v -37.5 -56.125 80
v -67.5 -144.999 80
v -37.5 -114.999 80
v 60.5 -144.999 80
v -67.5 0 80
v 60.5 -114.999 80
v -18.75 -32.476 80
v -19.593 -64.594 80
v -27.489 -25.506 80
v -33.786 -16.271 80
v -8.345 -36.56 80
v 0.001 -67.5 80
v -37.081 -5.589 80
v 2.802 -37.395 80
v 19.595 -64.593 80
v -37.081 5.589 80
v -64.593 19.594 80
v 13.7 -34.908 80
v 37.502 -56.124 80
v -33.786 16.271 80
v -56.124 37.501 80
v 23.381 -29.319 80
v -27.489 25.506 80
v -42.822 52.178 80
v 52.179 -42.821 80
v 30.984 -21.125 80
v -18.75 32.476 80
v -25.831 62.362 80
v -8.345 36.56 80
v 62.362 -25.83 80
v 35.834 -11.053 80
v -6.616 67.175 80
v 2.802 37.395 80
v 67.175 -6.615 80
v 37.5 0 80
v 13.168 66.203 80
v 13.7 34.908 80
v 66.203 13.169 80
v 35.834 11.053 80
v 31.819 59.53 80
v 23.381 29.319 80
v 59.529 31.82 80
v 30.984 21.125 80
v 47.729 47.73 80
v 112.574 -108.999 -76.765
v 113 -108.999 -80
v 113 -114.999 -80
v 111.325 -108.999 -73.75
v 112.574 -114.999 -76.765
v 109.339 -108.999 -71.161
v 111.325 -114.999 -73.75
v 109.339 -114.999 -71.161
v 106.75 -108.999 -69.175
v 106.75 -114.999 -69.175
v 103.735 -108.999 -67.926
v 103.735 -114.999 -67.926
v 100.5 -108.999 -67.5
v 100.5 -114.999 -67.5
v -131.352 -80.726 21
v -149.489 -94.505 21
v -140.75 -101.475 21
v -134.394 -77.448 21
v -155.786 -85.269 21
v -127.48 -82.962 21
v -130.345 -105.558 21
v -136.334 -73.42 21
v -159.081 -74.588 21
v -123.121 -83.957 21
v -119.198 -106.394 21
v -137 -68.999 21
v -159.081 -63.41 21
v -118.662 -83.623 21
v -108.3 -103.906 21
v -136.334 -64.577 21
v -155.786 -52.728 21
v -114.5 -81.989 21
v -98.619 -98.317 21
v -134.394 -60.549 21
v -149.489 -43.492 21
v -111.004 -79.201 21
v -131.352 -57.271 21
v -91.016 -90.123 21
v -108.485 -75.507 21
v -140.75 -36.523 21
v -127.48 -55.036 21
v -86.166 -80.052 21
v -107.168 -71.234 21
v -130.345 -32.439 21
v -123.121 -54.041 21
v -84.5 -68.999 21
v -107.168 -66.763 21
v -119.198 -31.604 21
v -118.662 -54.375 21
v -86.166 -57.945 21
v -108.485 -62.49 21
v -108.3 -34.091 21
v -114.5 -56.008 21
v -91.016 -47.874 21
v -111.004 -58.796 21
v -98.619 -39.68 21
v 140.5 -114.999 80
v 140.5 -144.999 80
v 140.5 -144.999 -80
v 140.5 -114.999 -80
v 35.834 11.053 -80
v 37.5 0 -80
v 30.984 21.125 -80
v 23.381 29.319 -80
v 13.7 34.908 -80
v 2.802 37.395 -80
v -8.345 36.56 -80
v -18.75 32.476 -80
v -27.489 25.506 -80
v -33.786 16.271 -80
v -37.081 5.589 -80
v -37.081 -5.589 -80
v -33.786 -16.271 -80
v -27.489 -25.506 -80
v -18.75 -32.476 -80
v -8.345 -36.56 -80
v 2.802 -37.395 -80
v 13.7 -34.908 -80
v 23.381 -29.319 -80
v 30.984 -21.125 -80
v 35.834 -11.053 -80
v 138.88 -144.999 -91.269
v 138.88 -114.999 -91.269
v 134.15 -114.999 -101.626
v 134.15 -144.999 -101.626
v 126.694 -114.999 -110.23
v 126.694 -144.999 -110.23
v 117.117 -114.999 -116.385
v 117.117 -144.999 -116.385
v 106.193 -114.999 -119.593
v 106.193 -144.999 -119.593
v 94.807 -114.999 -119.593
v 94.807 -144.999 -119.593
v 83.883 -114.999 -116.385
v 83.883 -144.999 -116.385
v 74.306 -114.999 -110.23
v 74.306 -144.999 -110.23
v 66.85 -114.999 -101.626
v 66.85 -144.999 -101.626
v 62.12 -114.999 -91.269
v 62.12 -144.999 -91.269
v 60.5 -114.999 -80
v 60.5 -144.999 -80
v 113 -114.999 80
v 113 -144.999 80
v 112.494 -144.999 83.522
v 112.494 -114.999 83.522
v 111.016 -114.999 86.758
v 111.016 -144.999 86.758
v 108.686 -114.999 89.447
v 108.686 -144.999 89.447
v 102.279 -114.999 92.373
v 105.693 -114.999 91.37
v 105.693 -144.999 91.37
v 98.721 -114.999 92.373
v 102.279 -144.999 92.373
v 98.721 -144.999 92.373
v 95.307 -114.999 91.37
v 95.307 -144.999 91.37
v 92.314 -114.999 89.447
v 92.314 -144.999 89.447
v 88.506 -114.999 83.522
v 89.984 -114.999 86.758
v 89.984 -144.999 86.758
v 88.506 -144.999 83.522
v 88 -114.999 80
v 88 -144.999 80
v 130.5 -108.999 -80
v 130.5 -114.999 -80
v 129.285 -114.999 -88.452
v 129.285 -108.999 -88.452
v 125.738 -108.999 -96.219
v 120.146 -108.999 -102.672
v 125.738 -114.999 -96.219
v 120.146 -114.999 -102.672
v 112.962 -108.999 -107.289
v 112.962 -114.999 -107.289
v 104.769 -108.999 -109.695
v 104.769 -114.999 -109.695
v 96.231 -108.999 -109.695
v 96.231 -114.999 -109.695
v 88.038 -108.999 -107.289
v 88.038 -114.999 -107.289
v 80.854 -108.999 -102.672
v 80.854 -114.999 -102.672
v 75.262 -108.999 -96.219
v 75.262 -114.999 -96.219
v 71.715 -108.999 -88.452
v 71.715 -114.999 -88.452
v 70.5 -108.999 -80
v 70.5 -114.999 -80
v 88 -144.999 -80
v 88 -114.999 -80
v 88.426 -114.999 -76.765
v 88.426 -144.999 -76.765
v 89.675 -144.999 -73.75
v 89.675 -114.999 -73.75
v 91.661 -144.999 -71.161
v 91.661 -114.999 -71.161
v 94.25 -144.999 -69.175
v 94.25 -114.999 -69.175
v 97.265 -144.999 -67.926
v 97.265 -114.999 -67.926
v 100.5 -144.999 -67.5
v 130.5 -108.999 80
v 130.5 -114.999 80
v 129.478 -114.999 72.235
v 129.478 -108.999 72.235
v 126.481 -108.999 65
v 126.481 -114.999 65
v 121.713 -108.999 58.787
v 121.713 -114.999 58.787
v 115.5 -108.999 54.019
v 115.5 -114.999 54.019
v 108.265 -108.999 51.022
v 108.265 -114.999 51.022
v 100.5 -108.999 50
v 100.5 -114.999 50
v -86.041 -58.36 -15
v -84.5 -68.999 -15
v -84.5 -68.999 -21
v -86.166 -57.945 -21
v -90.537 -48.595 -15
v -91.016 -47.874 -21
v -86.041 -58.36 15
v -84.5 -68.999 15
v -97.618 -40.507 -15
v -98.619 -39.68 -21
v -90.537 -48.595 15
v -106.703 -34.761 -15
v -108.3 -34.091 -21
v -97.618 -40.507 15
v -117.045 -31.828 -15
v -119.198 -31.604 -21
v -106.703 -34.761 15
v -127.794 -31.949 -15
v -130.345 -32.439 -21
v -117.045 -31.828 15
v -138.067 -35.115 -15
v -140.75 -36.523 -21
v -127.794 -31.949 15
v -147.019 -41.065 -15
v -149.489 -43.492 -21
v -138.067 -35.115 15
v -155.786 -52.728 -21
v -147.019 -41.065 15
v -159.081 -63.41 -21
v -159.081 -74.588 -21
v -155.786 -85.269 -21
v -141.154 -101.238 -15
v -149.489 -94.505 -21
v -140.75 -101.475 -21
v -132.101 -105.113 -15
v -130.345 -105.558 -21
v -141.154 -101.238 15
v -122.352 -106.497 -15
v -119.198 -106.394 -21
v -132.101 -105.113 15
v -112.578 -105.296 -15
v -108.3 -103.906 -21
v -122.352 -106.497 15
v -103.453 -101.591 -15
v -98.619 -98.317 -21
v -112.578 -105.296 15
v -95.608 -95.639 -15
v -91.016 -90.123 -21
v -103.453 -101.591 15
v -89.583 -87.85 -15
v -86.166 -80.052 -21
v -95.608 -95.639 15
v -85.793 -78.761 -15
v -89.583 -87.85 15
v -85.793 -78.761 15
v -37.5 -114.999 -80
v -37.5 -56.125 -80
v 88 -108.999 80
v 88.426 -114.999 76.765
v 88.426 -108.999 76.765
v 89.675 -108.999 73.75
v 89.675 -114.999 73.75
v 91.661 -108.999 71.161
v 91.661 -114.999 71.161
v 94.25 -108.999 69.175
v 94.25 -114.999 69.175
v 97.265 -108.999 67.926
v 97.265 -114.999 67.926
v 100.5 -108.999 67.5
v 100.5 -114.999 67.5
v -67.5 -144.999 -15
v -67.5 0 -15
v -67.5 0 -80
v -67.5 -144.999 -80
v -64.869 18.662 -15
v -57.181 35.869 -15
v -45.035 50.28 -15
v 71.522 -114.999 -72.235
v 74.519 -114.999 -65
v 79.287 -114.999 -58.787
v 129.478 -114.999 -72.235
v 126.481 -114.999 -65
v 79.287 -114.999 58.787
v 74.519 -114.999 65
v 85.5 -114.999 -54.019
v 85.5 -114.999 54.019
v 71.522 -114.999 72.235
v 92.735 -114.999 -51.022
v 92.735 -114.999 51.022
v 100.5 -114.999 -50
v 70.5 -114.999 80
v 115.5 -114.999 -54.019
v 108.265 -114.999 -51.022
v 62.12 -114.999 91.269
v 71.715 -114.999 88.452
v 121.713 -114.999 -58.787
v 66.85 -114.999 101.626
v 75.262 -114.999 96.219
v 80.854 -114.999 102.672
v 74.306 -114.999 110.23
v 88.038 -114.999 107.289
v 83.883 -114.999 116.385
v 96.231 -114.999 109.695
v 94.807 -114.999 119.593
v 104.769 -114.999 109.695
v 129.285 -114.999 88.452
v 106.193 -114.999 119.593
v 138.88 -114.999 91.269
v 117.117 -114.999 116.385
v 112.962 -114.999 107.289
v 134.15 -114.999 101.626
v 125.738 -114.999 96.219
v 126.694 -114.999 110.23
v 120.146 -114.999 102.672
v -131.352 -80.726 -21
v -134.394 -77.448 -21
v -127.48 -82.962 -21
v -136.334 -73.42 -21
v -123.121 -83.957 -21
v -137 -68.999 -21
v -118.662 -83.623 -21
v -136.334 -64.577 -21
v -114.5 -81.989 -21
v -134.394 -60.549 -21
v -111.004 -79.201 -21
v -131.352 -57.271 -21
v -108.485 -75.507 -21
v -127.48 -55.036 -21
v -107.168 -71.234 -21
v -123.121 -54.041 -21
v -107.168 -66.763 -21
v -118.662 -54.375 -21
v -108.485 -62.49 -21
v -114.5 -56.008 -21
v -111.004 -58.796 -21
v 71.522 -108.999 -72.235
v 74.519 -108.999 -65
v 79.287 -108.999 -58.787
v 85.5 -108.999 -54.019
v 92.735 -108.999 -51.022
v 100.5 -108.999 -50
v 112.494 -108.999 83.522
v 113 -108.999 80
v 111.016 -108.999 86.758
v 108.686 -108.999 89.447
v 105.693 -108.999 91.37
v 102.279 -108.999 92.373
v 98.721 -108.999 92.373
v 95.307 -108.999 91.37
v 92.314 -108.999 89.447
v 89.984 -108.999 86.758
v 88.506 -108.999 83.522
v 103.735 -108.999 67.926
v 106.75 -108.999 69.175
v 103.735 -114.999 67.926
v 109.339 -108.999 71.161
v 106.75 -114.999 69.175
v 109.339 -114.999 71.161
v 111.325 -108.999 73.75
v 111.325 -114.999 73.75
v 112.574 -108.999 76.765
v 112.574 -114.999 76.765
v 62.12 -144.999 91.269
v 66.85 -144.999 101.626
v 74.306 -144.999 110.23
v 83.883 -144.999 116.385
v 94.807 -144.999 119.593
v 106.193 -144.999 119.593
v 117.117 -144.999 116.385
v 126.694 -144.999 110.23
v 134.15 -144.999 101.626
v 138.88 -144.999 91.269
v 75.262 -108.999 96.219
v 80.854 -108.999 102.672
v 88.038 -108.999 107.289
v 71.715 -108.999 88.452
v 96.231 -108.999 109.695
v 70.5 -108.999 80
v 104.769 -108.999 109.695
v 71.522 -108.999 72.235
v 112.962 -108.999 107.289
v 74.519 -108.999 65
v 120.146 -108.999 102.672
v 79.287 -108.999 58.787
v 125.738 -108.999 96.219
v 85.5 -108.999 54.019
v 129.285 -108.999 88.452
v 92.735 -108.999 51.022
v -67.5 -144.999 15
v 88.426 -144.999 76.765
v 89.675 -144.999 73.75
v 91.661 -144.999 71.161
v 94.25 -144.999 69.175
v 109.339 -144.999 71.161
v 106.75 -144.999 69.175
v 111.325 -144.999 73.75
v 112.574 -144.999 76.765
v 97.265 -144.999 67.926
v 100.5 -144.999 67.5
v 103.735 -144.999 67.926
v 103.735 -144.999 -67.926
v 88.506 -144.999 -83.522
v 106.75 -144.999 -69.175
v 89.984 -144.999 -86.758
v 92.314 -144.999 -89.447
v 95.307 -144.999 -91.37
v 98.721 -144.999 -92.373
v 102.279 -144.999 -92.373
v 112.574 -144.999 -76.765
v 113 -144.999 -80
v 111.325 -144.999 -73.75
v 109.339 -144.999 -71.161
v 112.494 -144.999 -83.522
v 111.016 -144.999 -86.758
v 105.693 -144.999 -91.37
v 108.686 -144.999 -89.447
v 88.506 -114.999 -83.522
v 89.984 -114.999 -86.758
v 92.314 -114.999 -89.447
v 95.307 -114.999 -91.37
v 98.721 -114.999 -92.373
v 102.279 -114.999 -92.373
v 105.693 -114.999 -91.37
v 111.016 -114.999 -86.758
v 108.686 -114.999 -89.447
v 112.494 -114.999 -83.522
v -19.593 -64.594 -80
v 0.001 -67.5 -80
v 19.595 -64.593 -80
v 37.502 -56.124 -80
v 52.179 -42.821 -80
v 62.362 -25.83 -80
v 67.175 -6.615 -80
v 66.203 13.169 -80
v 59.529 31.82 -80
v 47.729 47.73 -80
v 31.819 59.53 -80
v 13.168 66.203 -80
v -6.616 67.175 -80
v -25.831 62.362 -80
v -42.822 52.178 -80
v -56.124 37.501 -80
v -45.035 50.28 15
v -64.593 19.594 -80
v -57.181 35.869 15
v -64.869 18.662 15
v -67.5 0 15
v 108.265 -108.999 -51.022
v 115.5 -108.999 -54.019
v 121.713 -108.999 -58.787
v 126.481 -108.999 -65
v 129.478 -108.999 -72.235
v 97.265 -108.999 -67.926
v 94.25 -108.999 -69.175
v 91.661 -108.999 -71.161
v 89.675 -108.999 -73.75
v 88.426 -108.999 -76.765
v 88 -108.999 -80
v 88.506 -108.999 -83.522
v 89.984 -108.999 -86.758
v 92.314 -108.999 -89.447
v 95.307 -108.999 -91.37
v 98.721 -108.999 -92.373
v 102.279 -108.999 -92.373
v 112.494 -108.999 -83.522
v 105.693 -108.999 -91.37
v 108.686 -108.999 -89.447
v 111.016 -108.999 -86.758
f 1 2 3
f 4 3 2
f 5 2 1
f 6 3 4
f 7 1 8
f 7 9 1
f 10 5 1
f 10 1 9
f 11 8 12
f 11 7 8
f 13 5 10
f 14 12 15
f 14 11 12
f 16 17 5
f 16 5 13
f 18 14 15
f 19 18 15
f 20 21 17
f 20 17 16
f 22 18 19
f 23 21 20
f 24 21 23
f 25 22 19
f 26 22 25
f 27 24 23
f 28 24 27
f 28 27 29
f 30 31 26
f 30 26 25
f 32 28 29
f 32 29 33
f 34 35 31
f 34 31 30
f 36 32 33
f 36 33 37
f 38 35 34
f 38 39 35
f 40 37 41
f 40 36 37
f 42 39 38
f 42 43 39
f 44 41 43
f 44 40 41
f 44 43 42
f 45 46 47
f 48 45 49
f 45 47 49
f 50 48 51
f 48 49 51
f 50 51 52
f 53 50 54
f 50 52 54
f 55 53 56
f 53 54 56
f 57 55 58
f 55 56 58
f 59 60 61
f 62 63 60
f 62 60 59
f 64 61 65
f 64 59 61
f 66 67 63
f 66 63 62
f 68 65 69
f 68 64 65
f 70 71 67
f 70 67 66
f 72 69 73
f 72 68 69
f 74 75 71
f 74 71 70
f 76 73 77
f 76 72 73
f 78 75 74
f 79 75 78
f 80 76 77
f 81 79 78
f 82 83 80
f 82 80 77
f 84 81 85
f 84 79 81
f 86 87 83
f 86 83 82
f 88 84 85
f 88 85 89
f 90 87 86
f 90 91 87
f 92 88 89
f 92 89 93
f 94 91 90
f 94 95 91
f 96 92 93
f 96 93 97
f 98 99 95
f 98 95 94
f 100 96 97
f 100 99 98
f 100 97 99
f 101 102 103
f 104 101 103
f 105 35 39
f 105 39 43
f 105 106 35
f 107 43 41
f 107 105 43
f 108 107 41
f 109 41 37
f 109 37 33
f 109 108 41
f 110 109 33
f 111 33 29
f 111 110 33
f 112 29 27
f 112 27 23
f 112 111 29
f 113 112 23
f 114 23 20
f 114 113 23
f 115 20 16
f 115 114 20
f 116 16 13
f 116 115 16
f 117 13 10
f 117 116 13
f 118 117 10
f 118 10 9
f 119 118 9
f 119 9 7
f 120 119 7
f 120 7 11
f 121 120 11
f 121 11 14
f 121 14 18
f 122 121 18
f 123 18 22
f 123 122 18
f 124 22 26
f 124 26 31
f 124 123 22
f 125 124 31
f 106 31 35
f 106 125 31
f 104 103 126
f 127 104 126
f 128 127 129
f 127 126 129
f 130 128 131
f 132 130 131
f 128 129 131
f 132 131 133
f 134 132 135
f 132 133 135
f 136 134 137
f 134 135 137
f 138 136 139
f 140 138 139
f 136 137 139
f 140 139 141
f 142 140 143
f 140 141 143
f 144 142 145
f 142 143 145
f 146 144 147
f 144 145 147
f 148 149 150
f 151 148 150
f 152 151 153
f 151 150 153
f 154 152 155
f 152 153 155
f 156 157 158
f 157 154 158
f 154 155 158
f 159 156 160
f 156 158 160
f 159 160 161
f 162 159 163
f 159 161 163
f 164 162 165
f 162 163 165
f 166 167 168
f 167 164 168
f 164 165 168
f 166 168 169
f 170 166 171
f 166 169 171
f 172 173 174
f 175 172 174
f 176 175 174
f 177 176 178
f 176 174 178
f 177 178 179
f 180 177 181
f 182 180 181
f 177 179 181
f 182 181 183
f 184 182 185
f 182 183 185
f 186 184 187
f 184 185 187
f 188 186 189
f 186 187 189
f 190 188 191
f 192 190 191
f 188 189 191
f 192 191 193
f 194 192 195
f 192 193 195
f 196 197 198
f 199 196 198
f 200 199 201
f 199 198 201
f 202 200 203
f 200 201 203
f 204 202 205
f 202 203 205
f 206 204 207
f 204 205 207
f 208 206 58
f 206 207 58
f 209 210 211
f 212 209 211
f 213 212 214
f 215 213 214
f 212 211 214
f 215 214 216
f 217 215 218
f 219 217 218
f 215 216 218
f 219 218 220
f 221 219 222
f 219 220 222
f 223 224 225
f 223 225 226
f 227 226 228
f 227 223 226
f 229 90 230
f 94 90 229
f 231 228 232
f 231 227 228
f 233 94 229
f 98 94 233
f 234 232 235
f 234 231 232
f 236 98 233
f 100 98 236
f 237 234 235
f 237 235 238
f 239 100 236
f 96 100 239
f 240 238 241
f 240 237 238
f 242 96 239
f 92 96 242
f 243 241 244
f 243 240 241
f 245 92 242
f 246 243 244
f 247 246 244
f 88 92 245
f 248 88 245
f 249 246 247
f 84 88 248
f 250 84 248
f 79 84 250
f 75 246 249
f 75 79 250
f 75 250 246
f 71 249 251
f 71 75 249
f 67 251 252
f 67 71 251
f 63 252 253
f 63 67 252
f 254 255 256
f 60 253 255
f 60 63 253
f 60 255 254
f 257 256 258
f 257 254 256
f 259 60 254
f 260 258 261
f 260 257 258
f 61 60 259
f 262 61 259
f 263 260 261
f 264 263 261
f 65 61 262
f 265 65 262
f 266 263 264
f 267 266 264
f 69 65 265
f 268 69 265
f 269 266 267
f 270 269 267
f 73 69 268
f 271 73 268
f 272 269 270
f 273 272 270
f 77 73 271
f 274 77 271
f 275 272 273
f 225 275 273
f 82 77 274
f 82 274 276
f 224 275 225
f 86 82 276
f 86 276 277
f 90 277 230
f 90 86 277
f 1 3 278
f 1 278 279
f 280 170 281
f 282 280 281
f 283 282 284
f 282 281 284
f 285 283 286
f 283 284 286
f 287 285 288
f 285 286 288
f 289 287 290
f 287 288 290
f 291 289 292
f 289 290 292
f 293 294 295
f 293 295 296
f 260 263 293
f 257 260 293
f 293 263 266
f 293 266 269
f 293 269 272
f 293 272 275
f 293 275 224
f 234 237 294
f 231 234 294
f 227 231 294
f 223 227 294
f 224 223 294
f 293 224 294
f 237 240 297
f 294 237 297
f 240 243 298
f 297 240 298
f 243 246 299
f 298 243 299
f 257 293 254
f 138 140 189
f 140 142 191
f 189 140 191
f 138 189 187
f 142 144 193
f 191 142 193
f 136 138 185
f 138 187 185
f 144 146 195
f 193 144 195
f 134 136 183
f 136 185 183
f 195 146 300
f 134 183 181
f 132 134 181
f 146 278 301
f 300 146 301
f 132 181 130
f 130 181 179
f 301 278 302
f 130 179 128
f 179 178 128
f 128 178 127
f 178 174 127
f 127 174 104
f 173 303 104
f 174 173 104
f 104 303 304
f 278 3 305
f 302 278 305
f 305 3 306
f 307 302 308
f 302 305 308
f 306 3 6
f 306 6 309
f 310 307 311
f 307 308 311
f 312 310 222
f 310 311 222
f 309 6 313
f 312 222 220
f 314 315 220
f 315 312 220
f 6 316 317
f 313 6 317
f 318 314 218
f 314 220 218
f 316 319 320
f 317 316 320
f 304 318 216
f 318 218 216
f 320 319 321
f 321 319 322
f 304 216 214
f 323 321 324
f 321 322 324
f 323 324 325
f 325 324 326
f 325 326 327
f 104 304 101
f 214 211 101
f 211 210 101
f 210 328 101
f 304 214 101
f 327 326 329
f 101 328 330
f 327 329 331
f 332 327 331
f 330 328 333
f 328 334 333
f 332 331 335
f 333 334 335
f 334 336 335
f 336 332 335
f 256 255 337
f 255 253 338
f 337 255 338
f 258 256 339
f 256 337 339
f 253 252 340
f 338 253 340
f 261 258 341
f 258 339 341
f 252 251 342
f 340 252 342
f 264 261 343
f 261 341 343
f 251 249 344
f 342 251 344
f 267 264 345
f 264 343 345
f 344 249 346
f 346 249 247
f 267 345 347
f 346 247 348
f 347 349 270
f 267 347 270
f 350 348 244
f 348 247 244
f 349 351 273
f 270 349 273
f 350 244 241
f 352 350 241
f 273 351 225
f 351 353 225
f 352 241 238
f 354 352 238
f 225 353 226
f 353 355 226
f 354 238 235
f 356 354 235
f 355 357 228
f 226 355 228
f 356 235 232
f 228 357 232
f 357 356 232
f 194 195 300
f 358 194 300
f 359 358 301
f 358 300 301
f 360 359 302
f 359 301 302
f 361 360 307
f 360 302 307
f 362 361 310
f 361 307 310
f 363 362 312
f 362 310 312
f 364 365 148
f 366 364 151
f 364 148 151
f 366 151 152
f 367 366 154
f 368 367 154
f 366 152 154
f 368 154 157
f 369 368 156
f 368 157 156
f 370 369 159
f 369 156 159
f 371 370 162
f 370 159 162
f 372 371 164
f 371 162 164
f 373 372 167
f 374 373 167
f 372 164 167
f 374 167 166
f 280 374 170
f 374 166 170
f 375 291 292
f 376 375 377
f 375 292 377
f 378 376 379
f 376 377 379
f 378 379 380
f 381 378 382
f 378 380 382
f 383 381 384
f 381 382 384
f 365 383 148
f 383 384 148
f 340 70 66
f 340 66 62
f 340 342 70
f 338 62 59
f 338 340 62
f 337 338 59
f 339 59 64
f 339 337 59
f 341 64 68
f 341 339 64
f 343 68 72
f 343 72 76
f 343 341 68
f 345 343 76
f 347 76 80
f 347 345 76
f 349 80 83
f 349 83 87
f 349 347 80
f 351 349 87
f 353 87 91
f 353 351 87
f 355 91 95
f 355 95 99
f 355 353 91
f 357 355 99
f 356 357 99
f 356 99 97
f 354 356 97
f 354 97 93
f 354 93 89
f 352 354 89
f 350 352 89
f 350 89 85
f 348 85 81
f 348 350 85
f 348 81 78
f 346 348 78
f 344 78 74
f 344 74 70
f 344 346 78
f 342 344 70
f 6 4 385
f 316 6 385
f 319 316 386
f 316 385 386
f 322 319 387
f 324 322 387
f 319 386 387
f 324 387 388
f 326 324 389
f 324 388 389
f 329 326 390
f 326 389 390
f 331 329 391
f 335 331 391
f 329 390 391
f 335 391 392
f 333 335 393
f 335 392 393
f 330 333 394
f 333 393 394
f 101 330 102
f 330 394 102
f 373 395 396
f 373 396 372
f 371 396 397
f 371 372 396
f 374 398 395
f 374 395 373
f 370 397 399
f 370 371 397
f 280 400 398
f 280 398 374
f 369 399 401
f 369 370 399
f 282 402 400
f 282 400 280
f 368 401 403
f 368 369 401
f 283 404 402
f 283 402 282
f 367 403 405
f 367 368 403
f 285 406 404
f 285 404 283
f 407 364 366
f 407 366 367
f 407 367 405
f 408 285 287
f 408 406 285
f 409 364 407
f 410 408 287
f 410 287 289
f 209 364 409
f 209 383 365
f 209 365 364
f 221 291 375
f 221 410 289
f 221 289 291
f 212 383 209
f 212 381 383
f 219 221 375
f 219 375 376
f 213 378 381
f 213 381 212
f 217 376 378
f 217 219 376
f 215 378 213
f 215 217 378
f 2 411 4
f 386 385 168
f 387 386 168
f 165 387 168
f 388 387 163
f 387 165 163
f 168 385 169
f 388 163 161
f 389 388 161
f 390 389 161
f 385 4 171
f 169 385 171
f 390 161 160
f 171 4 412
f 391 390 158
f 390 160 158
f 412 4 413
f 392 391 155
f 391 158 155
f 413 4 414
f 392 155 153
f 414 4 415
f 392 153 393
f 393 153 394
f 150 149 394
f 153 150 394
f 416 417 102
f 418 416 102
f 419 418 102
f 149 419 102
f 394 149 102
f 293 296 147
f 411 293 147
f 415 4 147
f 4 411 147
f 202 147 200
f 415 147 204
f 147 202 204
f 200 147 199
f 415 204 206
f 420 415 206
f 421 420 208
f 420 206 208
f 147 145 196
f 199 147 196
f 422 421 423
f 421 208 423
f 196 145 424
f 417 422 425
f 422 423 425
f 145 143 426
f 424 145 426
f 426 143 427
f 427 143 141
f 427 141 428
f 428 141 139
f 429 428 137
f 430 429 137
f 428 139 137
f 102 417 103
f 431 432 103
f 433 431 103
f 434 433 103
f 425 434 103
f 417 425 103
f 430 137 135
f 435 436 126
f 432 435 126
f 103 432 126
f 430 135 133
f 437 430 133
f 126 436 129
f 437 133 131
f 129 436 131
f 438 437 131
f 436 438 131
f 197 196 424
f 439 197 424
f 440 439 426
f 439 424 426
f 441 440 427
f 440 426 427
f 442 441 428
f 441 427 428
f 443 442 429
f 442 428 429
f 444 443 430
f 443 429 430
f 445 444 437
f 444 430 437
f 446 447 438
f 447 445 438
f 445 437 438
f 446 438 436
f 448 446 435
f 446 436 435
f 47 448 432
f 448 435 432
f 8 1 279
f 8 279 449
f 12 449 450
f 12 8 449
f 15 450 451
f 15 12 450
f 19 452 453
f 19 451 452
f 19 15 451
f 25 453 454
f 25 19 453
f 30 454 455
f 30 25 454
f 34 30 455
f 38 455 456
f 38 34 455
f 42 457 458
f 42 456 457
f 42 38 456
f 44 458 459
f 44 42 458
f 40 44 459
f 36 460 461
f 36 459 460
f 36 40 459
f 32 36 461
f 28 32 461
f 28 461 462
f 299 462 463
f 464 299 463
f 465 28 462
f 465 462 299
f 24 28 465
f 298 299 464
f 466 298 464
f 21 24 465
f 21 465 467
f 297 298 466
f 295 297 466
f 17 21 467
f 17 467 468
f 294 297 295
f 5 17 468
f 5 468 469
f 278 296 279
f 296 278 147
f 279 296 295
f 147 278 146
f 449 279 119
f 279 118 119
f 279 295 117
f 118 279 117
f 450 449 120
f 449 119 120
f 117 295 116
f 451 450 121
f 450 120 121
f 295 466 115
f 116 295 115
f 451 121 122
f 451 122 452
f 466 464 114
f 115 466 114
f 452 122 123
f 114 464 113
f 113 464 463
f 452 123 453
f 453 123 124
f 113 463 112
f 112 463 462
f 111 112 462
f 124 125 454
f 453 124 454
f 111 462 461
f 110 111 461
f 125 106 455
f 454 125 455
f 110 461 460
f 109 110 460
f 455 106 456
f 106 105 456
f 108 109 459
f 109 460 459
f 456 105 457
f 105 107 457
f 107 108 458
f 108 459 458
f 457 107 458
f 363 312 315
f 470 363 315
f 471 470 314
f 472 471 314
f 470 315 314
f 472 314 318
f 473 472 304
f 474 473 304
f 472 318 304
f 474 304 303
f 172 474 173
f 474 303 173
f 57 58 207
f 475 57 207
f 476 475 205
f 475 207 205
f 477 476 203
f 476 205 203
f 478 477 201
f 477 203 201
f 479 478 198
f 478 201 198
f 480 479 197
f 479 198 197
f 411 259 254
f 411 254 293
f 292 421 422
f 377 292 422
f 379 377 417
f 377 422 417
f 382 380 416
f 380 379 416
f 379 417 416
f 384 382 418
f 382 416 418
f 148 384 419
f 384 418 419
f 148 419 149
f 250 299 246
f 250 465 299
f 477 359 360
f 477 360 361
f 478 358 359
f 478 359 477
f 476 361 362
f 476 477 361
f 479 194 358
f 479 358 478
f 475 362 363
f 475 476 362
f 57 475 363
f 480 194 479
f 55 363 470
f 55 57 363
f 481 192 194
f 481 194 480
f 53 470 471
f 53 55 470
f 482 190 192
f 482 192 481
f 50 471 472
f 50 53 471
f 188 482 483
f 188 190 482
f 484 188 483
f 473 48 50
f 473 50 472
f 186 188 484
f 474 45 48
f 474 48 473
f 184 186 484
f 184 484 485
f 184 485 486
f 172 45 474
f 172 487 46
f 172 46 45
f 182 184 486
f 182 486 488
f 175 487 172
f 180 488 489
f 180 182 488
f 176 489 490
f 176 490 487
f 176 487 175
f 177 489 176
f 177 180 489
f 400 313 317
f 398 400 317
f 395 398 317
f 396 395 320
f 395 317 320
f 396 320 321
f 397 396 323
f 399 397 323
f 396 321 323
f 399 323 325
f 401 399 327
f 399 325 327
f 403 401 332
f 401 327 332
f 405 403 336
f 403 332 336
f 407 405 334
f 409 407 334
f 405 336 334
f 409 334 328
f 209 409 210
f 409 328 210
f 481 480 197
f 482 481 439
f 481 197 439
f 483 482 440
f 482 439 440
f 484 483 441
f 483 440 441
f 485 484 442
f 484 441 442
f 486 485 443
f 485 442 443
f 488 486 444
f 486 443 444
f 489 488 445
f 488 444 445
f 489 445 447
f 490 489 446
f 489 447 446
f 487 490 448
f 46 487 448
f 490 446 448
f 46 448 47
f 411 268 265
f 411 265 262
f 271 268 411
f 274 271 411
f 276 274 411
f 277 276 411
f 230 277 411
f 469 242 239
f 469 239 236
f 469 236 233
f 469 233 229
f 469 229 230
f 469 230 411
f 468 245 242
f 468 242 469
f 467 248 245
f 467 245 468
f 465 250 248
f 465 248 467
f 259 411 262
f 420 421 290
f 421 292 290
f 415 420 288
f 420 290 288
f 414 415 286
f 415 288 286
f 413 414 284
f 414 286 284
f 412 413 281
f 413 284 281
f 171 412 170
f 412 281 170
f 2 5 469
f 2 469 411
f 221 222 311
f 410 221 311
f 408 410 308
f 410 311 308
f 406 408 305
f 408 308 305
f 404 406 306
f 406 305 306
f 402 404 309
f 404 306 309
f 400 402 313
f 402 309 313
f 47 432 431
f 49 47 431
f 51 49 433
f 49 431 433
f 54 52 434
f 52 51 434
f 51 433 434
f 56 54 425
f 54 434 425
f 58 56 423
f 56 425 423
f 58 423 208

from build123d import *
from build123d.topology import SkipClean

# Parameters (mm, degrees)
SKETCH1_R            = 67.5
SKETCH1_R_2          = 37.5
SKETCH1_W            = 80
SKETCH1_H            = 30
BOSS_EXTRUDE3_DEPTH  = 80
BOSS_EXTRUDE4_DEPTH  = 15
SKETCH1_6_R          = 37.5
SKETCH1_6_R_2        = 15
BOSS_EXTRUDE5_DEPTH  = 21
BOSS_EXTRUDE13_START = -30
BOSS_EXTRUDE13_DEPTH = 30
BOSS_EXTRUDE14_START = -30
BOSS_EXTRUDE14_DEPTH = 36
SKETCH3_11_R         = 12.5
CUT_EXTRUDE3_DEPTH   = 271.45518904


with BuildPart() as part:
    # Sketch1 → Boss-Extrude3 (new, symmetric)
    # profile 1 of 3: a face of its own
    with BuildSketch(Plane.XY):
        with BuildLine():
            ThreePointArc((-37.5, -56.124860802), (-59.529404499, -31.819805153), (-67.5, 0))
            Line((-67.5, 0), (-67.5, -144.998655553))
            Line((-67.5, -144.998655553), (20.5, -144.998655553))
            Line((20.5, -144.998655553), (20.5, -114.998655553))
            Line((20.5, -114.998655553), (-37.5, -114.998655553))
            Line((-37.5, -114.998655553), (-37.5, -56.124860802))
        make_face()
    # profile 2 of 3: a face of its own
    with BuildSketch(Plane.XY):
        Circle(SKETCH1_R)
        Circle(SKETCH1_R_2, mode=Mode.SUBTRACT)
    # profile 3 of 3: a face of its own
    with BuildSketch(Plane.XY):
        with Locations((60.5, -129.998655553)):
            Rectangle(SKETCH1_W, SKETCH1_H)
    extrude(amount=BOSS_EXTRUDE3_DEPTH, both=True)

    # Sketch1<5> → Boss-Extrude4 (add, symmetric)
    with BuildSketch(Plane.XY):
        with BuildLine():
            Line((-67.5, -144.998655553), (-67.5, 0))
            ThreePointArc((-67.5, 0), (-61.628366728, 27.535330295), (-45.034980312, 50.280220249))
            Line((-45.034980312, 50.280220249), (-147.019433507, -41.065199859))
            ThreePointArc((-147.019433507, -41.065199859), (-106.70259428, -34.760674037), (-84.5, -68.998655553))
            ThreePointArc((-84.5, -68.998655553), (-103.453333037, -101.591156907), (-141.154461042, -101.237709853))
            Line((-141.154461042, -101.237709853), (-67.5, -144.998655553))
        make_face()
    extrude(amount=BOSS_EXTRUDE4_DEPTH, both=True)

    # Sketch1<6> → Boss-Extrude5 (add, symmetric)
    with BuildSketch(Plane.XY):
        with Locations((-122, -68.998655553)):
            Circle(SKETCH1_6_R)
        with Locations(Location((-122, -68.998655553, 0), (0, 0, 180))):
            Circle(SKETCH1_6_R_2, mode=Mode.SUBTRACT)
    extrude(amount=BOSS_EXTRUDE5_DEPTH, both=True)

    # Sketch3 → Boss-Extrude13 (add)
    with BuildSketch(Plane(origin=(0, -114.998655553, 0), x_dir=(1, 0, 0), z_dir=(0, 1, 0)).offset(BOSS_EXTRUDE13_START)):
        with BuildLine():
            Line((100.5, 40), (100.5, 0))
            Line((100.5, 0), (140.5, 0))
            Line((140.5, 0), (140.5, 80))
            Line((140.5, 80), (130.5, 80))
            ThreePointArc((130.5, 80), (121.713203436, 58.786796564), (100.5, 50))
            Line((100.5, 50), (100.5, 40))
        make_face()
        with BuildLine():
            Line((140.5, 0), (100.5, 0))
            Line((100.5, 0), (100.5, -40))
            Line((100.5, -40), (100.5, -50))
            ThreePointArc((100.5, -50), (121.713203436, -58.786796564), (130.5, -80))
            ThreePointArc((130.5, -80), (100.5, -110), (70.5, -80))
            Line((70.5, -80), (60.5, -80))
            ThreePointArc((60.5, -80), (100.5, -120), (140.5, -80))
            Line((140.5, -80), (140.5, 0))
        make_face()
        with BuildLine():
            Line((130.5, 80), (140.5, 80))
            ThreePointArc((140.5, 80), (100.5, 120), (60.5, 80))
            Line((60.5, 80), (70.5, 80))
            ThreePointArc((70.5, 80), (100.5, 110), (130.5, 80))
        make_face()
    extrude(amount=BOSS_EXTRUDE13_DEPTH)

    # Sketch3<10> → Boss-Extrude14 (add)
    with BuildSketch(Plane(origin=(0, -114.998655553, 0), x_dir=(1, 0, 0), z_dir=(0, 1, 0)).offset(BOSS_EXTRUDE14_START)):
        with BuildLine():
            Line((88, -80), (70.5, -80))
            ThreePointArc((70.5, -80), (100.5, -110), (130.5, -80))
            ThreePointArc((130.5, -80), (121.713203436, -58.786796564), (100.5, -50))
            Line((100.5, -50), (100.5, -67.5))
            ThreePointArc((100.5, -67.5), (109.338834765, -71.161165235), (113, -80))
            ThreePointArc((113, -80), (100.5, -92.5), (88, -80))
        make_face()
        with BuildLine():
            ThreePointArc((100.5, -50), (79.286796564, -58.786796564), (70.5, -80))
            Line((70.5, -80), (88, -80))
            ThreePointArc((88, -80), (91.661165235, -71.161165235), (100.5, -67.5))
            Line((100.5, -67.5), (100.5, -50))
        make_face()
        with BuildLine():
            Line((113, 80), (130.5, 80))
            ThreePointArc((130.5, 80), (100.5, 110), (70.5, 80))
            Line((70.5, 80), (88, 80))
            ThreePointArc((88, 80), (100.5, 92.5), (113, 80))
        make_face()
        with BuildLine():
            ThreePointArc((100.5, 50), (121.713203436, 58.786796564), (130.5, 80))
            Line((130.5, 80), (113, 80))
            ThreePointArc((113, 80), (109.338834765, 71.161165235), (100.5, 67.5))
            Line((100.5, 67.5), (100.5, 50))
        make_face()
        with BuildLine():
            Line((88, 80), (70.5, 80))
            ThreePointArc((70.5, 80), (79.286796564, 58.786796564), (100.5, 50))
            Line((100.5, 50), (100.5, 67.5))
            ThreePointArc((100.5, 67.5), (91.661165235, 71.161165235), (88, 80))
        make_face()
    extrude(amount=BOSS_EXTRUDE14_DEPTH)

    # Sketch3<11> → Cut-Extrude3 (cut, through all)
    with SkipClean():  # the faces are left unmerged after this step: merging them gives an invalid solid
        with BuildSketch(Plane(origin=(0, -114.998655553, 0), x_dir=(1, 0, 0), z_dir=(0, 1, 0))):
            with Locations(Location((100.5, -80, 0), (0, 0, 180))):
                Circle(SKETCH3_11_R)
            with Locations(Location((100.5, 80, 0), (0, 0, 180))):
                Circle(SKETCH3_11_R)
        extrude(amount=-CUT_EXTRUDE3_DEPTH, mode=Mode.SUBTRACT)


solid = part.part
